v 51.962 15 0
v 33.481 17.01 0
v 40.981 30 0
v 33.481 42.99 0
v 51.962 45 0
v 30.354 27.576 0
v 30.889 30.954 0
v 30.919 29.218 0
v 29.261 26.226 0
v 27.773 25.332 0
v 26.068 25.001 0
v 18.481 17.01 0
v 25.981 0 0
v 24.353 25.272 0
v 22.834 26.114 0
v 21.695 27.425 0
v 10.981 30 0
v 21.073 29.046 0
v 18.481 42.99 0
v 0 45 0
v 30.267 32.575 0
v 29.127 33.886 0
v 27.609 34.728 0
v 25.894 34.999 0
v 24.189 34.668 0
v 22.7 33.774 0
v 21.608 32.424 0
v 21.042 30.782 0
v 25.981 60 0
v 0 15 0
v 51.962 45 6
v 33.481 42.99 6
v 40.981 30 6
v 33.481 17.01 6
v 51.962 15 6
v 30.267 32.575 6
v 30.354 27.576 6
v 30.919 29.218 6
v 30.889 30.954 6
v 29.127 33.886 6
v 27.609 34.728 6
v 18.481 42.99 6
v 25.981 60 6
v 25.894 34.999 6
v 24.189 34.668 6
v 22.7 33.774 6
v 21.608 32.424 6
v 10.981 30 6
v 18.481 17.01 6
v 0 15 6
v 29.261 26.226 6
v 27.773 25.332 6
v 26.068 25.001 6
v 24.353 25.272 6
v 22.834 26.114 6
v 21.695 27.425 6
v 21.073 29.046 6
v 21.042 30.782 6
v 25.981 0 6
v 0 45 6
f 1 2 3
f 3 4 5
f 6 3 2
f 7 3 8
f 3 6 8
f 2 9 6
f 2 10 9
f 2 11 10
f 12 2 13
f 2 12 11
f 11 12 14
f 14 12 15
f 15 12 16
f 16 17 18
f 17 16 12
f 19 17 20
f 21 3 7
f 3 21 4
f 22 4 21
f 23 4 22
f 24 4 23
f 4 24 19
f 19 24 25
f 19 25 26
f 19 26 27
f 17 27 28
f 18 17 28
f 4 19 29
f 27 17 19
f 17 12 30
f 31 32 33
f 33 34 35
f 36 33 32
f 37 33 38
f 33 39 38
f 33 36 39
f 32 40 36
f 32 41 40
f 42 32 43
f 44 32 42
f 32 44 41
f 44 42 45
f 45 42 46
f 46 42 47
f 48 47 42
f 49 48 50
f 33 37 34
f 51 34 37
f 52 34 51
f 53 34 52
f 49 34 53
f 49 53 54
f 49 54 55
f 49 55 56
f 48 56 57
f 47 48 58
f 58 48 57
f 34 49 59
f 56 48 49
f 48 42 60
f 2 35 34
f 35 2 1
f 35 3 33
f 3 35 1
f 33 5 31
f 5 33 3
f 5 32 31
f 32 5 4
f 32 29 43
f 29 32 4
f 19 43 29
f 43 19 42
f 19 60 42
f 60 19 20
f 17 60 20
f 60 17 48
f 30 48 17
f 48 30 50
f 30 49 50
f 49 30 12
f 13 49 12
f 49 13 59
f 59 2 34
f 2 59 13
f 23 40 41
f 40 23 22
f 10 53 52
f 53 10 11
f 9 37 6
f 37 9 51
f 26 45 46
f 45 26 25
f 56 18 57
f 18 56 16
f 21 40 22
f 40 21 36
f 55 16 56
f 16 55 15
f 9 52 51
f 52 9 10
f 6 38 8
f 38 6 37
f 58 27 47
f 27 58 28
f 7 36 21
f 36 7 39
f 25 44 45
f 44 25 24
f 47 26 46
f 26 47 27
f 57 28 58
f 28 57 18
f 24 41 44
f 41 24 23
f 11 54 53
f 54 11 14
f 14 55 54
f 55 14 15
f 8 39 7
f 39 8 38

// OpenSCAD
$fn = 32;

// ----------------------------------------------------------------------
// Star wheel: 6-point star, R30
// ----------------------------------------------------------------------

// --- parameters (mm) ---
n_points = 6;             // number of points / teeth
r_out = 30;               // tip radius
r_in = 15;                // root radius
bore_r = 5;               // centre bore radius
plate_t = 6;              // plate thickness, Z (extrusion height)
bore_d = 10;              // centre bore diameter
fit_tol = 0.05;           // declared fit tolerance (prompt contract)
free_tol = 0.2;           // declared free tolerance (prompt contract)

profile = [[25.981, 60], [18.481, 42.99], [0, 45], [10.981, 30], [0, 15], [18.481, 17.01], [25.981, 0], [33.481, 17.01], [51.962, 15], [40.981, 30], [51.962, 45], [33.481, 42.99]];  // primary outline, 12 points, counter clockwise
void_1 = [[30.889, 30.954], [30.267, 32.575], [29.127, 33.886], [27.609, 34.728], [25.894, 34.999], [24.189, 34.668], [22.7, 33.774], [21.608, 32.424], [21.042, 30.782], [21.073, 29.046], [21.695, 27.425], [22.834, 26.114], [24.353, 25.272], [26.068, 25.001], [27.773, 25.332], [29.261, 26.226], [30.354, 27.576], [30.919, 29.218]];  // centre bore, 18 points

// --- the one profile operation ---
difference() {
  linear_extrude(height = plate_t) polygon(points = profile);
  translate([0, 0, -1])
    linear_extrude(height = plate_t + 2) polygon(points = void_1);
}
